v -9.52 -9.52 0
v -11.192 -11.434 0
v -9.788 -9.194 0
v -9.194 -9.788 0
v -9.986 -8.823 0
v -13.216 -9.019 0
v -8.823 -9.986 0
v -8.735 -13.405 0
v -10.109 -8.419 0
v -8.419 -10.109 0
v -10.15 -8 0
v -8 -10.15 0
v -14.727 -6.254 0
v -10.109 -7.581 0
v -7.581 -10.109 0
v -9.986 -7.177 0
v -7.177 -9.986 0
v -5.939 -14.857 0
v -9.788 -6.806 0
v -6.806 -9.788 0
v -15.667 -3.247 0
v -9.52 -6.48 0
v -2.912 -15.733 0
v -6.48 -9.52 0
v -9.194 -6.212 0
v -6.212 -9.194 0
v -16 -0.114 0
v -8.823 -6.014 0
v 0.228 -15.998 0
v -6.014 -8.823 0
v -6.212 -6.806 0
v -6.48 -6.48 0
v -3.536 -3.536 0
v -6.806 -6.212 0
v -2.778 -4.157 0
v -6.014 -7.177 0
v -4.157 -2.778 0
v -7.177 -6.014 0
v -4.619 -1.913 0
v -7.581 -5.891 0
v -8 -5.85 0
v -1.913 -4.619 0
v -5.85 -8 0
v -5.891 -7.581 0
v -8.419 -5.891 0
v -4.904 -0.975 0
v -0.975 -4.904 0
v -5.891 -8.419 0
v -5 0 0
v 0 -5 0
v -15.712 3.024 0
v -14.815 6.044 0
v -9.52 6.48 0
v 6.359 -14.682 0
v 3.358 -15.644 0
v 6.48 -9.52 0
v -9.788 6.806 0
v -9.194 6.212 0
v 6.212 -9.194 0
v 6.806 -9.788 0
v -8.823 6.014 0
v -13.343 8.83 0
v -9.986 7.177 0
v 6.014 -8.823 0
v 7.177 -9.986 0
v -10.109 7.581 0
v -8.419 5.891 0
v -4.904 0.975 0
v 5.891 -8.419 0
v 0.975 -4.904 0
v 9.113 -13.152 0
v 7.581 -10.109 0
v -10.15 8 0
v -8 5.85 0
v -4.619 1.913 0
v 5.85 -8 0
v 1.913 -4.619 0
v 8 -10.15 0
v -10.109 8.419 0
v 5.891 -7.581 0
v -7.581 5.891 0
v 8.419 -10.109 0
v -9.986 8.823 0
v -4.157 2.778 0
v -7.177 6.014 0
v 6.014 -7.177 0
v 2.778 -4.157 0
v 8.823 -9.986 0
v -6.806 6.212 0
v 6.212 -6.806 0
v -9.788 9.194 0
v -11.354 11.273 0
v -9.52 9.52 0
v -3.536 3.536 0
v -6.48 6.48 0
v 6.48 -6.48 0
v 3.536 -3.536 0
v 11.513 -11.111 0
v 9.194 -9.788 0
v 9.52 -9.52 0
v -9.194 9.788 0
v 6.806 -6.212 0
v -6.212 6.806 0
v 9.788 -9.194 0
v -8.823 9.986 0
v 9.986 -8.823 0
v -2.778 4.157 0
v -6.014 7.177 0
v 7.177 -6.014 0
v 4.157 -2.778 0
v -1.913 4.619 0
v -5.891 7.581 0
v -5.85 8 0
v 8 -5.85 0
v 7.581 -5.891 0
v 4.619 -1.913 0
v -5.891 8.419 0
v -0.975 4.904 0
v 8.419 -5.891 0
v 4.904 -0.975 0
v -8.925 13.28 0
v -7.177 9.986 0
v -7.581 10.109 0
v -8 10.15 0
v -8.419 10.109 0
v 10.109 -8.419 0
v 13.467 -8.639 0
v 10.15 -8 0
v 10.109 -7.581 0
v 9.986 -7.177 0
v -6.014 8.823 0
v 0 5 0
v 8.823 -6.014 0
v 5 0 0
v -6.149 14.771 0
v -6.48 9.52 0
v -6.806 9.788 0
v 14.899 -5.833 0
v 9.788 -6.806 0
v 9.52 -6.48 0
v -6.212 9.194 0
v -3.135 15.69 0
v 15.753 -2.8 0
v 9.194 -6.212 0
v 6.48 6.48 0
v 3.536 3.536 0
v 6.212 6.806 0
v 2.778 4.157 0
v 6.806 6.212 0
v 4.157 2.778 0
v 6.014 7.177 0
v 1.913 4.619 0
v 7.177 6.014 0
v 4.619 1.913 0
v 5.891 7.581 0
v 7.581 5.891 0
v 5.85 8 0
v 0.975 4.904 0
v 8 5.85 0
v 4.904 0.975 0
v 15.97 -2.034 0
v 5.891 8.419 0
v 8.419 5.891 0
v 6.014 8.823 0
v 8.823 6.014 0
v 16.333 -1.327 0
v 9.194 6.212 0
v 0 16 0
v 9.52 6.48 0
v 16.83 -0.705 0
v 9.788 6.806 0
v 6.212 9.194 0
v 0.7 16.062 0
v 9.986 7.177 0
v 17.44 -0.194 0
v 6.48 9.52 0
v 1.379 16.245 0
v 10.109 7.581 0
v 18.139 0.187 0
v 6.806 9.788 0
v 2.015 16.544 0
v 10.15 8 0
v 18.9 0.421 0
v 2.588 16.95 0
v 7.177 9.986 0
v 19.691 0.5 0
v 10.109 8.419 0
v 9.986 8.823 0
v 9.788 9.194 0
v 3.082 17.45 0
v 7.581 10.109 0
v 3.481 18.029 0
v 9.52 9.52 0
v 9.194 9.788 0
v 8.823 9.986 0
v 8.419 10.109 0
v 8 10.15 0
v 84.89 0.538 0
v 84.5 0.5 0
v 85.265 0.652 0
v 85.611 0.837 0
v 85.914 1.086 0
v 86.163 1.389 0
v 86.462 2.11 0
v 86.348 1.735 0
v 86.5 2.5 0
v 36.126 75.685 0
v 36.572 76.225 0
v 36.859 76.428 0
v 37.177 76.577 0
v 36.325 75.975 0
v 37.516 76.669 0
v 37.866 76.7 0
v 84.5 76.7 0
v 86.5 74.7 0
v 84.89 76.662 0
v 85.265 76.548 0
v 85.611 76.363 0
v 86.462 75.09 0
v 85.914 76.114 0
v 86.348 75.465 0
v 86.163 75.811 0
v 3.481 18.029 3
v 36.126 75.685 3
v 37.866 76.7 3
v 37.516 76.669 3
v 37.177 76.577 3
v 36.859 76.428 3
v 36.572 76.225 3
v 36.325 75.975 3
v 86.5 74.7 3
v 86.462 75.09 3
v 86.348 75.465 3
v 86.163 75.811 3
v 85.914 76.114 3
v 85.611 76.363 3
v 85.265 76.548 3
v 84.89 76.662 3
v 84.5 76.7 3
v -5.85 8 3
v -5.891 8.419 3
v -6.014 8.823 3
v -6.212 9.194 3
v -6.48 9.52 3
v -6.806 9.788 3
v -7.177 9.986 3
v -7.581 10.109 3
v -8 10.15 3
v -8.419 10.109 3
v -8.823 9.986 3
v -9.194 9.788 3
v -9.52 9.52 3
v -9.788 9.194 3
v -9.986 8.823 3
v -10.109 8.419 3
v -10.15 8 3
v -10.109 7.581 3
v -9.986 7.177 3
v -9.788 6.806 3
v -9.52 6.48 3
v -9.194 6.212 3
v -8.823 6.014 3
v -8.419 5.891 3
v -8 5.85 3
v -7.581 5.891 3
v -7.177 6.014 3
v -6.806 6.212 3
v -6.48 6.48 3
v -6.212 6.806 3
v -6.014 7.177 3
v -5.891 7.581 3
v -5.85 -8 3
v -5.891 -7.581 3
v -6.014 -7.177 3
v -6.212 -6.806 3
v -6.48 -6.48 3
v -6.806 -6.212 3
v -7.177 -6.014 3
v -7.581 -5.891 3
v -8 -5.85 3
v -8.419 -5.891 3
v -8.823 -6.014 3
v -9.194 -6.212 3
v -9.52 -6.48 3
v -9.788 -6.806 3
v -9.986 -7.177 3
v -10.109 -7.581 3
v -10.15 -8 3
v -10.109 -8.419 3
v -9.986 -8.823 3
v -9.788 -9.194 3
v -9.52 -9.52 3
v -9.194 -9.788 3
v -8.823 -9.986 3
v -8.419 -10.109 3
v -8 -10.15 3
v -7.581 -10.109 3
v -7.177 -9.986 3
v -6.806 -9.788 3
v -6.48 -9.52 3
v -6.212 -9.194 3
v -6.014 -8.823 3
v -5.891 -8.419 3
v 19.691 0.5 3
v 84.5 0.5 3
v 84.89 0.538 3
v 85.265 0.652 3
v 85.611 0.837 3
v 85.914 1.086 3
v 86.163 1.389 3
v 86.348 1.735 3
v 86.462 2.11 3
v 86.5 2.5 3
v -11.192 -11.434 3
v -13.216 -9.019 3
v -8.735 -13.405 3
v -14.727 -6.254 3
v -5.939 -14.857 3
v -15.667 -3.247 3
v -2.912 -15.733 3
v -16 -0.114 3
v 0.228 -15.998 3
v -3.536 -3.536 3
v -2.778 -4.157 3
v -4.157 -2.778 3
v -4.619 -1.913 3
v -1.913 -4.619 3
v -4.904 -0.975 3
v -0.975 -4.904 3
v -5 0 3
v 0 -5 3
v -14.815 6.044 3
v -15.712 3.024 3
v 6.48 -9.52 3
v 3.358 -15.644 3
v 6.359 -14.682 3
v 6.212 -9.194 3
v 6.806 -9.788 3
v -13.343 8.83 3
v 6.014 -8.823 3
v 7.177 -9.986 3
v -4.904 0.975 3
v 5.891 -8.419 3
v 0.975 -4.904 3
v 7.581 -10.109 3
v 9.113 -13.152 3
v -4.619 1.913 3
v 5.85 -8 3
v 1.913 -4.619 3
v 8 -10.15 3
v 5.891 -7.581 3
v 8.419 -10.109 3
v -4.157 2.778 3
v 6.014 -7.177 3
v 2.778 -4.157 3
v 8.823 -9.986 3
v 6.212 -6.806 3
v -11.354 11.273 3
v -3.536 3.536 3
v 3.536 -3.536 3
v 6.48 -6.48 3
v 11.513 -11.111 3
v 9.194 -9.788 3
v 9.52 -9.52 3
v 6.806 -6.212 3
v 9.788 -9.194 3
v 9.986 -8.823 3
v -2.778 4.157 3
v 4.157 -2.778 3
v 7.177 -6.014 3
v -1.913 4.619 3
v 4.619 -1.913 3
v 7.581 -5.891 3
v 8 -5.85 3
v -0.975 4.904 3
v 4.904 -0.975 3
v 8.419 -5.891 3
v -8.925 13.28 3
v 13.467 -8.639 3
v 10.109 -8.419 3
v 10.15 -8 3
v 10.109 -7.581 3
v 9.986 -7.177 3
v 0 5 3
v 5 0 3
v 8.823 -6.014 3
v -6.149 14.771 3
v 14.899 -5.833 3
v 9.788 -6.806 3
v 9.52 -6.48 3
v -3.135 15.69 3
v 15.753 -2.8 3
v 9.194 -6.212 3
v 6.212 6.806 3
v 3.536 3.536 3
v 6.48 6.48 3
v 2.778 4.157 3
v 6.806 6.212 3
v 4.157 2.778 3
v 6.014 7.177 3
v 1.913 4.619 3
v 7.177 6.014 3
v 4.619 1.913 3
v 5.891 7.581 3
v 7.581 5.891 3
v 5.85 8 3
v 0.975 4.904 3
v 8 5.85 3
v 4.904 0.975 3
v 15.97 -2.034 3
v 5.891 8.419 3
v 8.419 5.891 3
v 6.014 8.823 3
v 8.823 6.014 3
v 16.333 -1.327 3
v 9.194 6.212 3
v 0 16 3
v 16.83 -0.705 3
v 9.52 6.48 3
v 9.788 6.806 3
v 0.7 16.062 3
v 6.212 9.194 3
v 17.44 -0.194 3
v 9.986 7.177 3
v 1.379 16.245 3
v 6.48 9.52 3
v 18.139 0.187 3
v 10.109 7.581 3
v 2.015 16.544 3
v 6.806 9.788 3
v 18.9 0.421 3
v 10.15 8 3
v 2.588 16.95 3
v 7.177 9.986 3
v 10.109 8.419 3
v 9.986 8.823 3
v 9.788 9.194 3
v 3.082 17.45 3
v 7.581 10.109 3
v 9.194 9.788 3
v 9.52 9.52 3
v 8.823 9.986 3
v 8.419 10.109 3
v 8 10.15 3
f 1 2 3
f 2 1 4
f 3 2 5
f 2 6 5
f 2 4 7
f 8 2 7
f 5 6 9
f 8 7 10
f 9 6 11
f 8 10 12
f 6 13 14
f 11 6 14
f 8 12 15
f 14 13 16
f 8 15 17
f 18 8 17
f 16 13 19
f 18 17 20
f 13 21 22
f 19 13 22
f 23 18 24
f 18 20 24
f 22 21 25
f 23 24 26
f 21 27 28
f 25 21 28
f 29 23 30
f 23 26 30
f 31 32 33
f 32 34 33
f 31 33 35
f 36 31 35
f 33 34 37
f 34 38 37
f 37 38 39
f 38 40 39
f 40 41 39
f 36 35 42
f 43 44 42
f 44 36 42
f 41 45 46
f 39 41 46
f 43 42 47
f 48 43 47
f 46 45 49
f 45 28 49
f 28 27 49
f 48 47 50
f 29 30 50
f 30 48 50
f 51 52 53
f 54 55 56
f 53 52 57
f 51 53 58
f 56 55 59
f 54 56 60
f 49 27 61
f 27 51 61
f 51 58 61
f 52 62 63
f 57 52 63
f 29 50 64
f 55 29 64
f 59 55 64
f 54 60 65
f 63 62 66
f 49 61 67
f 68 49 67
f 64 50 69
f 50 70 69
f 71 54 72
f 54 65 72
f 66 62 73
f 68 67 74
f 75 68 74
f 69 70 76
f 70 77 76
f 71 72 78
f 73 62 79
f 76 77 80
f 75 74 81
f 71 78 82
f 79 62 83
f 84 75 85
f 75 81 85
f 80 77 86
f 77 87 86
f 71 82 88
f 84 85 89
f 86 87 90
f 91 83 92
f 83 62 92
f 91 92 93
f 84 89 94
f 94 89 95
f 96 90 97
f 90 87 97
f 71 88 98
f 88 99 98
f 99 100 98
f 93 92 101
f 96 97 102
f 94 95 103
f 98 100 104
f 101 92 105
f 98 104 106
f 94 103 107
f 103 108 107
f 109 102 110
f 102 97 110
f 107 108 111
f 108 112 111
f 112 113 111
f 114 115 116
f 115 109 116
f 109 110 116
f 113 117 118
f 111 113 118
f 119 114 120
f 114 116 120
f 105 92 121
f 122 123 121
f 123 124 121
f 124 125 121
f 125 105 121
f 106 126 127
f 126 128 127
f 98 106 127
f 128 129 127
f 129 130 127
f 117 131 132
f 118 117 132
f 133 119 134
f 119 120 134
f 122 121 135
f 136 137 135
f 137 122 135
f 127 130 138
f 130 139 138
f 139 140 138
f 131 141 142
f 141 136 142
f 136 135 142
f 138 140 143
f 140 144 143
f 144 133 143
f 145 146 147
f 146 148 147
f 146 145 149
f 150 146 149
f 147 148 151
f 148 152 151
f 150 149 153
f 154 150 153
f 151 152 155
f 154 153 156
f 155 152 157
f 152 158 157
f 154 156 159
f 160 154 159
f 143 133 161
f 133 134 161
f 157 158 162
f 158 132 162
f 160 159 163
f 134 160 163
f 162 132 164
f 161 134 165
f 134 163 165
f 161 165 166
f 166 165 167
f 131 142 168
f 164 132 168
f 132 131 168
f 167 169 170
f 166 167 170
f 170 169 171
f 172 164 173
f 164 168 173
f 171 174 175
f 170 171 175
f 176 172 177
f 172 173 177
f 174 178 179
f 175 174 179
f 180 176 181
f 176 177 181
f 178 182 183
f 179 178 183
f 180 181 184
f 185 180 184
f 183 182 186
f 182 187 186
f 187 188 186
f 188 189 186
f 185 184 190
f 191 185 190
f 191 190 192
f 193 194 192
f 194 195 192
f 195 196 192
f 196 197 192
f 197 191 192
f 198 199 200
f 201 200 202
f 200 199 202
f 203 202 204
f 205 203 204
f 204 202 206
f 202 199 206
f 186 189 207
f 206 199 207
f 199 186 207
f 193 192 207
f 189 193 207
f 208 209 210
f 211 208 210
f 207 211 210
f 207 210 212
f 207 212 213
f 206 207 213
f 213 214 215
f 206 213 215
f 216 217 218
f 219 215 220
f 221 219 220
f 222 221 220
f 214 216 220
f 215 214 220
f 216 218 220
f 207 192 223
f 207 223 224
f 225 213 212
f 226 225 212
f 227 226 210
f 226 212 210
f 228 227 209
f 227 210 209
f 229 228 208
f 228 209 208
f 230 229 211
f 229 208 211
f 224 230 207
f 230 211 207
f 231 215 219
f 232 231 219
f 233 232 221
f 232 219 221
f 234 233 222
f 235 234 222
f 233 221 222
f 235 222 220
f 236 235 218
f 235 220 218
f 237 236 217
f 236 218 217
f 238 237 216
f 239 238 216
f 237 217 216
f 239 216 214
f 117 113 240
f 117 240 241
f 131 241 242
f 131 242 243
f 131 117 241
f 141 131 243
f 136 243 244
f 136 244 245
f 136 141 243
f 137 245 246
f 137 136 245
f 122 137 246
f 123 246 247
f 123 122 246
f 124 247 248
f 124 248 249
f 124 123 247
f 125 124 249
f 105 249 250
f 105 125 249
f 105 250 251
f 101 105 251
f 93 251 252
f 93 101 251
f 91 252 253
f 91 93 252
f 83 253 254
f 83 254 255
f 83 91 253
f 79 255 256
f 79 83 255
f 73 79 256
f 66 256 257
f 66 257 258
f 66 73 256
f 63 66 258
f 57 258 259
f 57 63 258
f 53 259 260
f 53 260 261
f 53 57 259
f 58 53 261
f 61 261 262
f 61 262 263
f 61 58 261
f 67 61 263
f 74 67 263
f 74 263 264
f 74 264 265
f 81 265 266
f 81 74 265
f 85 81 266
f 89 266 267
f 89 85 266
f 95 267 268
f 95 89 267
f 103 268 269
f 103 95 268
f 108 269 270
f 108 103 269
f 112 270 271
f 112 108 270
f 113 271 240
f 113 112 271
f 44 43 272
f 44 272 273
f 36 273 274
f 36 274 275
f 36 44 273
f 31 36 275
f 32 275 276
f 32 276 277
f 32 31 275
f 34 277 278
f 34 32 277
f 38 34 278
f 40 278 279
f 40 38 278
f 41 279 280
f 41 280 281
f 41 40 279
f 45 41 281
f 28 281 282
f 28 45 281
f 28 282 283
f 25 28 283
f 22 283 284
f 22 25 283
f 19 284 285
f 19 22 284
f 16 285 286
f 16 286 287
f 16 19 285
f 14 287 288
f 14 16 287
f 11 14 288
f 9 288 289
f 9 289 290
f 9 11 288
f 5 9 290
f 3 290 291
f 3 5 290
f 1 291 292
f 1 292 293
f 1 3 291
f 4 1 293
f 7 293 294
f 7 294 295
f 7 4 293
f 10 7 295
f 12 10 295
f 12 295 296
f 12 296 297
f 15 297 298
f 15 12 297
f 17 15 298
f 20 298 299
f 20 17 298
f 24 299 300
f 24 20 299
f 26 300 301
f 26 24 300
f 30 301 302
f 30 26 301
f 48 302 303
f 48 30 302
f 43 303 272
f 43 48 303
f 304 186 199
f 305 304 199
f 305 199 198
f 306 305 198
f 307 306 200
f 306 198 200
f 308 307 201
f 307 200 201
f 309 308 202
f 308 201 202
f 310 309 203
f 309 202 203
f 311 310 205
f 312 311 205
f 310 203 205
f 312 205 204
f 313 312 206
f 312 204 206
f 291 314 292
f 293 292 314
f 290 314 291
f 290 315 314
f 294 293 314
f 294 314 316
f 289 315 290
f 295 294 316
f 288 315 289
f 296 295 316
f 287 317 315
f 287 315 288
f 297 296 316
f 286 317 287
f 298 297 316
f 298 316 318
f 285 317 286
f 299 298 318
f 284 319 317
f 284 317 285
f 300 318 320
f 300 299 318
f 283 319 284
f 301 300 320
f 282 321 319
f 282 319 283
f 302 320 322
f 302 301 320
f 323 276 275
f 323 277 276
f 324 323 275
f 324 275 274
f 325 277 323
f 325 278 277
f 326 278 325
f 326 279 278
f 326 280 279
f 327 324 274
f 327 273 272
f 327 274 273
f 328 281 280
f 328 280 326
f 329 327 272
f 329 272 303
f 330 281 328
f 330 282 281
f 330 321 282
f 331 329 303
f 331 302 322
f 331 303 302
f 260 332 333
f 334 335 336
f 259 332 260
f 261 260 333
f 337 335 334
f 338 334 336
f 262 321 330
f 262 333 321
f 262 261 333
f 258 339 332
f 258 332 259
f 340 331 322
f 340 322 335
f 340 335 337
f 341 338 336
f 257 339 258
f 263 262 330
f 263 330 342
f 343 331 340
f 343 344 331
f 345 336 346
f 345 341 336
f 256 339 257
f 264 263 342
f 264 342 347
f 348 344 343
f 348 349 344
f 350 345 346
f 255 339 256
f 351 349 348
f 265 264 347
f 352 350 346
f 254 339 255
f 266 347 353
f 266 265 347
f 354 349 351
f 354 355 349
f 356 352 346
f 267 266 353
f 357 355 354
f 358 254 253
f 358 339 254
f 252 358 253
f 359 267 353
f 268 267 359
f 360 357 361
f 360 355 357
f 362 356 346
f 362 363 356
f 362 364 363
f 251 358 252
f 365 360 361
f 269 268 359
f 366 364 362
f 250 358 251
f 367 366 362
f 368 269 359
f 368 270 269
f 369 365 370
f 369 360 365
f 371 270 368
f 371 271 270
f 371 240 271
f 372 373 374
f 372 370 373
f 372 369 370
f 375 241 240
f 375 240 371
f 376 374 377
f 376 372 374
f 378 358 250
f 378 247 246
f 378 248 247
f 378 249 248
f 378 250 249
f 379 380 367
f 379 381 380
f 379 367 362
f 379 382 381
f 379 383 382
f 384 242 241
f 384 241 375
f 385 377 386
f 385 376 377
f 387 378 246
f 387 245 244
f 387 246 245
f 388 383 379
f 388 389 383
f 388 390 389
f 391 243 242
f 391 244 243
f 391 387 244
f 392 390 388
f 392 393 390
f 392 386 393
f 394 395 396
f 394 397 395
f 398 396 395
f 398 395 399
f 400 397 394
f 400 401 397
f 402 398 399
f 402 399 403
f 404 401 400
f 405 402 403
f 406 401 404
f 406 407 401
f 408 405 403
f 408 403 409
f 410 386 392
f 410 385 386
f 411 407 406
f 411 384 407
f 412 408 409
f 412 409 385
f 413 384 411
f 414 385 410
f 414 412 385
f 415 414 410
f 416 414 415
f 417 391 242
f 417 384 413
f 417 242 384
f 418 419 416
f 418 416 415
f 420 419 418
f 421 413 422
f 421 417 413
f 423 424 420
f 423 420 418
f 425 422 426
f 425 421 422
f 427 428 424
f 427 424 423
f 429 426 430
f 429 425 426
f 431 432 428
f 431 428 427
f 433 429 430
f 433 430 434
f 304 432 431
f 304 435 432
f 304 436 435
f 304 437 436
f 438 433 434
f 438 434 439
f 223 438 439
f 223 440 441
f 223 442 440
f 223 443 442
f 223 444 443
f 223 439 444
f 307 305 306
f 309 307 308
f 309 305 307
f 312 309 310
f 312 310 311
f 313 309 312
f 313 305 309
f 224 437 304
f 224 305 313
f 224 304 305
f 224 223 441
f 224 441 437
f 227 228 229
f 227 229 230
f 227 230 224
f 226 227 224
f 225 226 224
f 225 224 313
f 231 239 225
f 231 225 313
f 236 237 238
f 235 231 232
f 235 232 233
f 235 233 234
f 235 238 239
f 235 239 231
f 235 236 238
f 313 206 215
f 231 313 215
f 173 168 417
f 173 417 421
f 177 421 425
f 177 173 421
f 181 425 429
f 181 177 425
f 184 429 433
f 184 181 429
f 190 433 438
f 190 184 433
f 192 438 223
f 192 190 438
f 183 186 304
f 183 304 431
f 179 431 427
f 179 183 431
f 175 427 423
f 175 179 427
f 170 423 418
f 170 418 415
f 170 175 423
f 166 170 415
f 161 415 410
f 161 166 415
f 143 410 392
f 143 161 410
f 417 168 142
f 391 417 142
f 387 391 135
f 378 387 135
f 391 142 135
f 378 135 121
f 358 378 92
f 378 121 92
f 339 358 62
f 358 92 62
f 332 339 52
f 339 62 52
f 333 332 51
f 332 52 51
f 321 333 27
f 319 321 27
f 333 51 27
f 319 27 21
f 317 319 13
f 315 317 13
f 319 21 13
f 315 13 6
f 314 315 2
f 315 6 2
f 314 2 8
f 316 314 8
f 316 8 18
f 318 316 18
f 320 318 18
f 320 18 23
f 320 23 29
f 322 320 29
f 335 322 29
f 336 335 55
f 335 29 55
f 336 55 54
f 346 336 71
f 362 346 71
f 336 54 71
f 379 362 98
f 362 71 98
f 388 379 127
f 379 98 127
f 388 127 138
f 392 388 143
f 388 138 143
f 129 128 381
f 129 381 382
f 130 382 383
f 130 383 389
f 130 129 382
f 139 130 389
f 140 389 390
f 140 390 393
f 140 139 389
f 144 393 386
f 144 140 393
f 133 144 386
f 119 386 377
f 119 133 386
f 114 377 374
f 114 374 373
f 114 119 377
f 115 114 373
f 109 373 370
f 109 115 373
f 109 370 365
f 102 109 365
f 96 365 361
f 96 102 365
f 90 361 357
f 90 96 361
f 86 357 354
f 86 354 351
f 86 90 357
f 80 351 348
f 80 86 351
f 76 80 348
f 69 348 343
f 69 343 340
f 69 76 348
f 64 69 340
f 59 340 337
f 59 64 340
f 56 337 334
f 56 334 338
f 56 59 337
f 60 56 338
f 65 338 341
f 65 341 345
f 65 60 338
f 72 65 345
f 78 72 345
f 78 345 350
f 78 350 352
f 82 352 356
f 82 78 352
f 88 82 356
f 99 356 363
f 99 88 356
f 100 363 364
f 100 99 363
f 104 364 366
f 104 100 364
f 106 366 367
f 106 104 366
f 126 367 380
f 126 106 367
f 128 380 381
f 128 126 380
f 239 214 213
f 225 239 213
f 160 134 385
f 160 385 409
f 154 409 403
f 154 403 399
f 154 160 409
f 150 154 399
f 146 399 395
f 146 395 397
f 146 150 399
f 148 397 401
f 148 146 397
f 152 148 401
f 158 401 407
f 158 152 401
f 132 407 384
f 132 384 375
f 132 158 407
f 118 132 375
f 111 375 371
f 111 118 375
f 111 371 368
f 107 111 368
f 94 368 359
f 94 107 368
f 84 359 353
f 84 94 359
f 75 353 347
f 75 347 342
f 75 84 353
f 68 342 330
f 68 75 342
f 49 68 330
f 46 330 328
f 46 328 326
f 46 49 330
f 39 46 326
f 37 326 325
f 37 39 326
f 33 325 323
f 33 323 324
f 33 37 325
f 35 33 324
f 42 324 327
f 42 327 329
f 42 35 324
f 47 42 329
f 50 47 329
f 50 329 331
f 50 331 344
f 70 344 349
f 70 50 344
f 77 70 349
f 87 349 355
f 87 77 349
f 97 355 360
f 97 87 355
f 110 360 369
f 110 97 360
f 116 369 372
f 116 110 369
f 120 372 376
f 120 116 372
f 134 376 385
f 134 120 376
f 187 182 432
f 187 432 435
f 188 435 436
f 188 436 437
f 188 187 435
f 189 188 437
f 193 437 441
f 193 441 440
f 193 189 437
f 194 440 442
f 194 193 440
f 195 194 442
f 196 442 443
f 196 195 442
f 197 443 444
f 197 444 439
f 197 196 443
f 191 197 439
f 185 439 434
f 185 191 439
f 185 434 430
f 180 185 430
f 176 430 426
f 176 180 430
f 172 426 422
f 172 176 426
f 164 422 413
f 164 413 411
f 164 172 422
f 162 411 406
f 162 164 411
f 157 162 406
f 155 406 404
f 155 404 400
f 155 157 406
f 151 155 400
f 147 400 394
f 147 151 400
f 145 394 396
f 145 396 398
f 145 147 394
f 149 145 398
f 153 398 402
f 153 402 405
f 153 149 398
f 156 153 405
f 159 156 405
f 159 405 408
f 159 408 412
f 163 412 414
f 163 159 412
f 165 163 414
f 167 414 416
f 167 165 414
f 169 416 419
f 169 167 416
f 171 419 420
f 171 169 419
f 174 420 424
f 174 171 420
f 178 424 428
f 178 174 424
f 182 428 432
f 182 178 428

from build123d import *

# Parameters (mm, degrees)
SKETCH_R   = 2.15
SKETCH_R_2 = 5
PAD_DEPTH  = 3


with BuildPart() as part:
    # Sketch → Pad (new body)
    with BuildSketch(Plane.XY):
        with BuildLine():
            Line((36.7, 0.5), (84.5, 0.5))
            ThreePointArc((84.5, 0.5), (85.914214, 1.085786), (86.5, 2.5))
            Line((86.5, 2.5), (86.5, 74.7))
            ThreePointArc((86.5, 74.7), (85.914214, 76.114214), (84.5, 76.7))
            Line((84.5, 76.7), (37.865935, 76.7))
            ThreePointArc((37.865935, 76.7), (36.858665, 76.427833), (36.12554, 75.685406))
            Line((3.48079, 18.029189), (36.12554, 75.685406))
            ThreePointArc((0, 16), (2.014541, 16.544335), (3.48079, 18.029189))
            ThreePointArc((0, 16), (-12.263768, -10.276186), (15.753095, -2.8))
            ThreePointArc((19.691369, 0.5), (17.122322, -0.434058), (15.753095, -2.8))
            Line((36.7, 0.5), (19.691369, 0.5))
        make_face()
        with Locations((-8, 8)):
            Circle(SKETCH_R, mode=Mode.SUBTRACT)
        with Locations((8, 8)):
            Circle(SKETCH_R, mode=Mode.SUBTRACT)
        with Locations((-8, -8)):
            Circle(SKETCH_R, mode=Mode.SUBTRACT)
        with Locations((8, -8)):
            Circle(SKETCH_R, mode=Mode.SUBTRACT)
        Circle(SKETCH_R_2, mode=Mode.SUBTRACT)
    extrude(amount=PAD_DEPTH)


solid = part.part
